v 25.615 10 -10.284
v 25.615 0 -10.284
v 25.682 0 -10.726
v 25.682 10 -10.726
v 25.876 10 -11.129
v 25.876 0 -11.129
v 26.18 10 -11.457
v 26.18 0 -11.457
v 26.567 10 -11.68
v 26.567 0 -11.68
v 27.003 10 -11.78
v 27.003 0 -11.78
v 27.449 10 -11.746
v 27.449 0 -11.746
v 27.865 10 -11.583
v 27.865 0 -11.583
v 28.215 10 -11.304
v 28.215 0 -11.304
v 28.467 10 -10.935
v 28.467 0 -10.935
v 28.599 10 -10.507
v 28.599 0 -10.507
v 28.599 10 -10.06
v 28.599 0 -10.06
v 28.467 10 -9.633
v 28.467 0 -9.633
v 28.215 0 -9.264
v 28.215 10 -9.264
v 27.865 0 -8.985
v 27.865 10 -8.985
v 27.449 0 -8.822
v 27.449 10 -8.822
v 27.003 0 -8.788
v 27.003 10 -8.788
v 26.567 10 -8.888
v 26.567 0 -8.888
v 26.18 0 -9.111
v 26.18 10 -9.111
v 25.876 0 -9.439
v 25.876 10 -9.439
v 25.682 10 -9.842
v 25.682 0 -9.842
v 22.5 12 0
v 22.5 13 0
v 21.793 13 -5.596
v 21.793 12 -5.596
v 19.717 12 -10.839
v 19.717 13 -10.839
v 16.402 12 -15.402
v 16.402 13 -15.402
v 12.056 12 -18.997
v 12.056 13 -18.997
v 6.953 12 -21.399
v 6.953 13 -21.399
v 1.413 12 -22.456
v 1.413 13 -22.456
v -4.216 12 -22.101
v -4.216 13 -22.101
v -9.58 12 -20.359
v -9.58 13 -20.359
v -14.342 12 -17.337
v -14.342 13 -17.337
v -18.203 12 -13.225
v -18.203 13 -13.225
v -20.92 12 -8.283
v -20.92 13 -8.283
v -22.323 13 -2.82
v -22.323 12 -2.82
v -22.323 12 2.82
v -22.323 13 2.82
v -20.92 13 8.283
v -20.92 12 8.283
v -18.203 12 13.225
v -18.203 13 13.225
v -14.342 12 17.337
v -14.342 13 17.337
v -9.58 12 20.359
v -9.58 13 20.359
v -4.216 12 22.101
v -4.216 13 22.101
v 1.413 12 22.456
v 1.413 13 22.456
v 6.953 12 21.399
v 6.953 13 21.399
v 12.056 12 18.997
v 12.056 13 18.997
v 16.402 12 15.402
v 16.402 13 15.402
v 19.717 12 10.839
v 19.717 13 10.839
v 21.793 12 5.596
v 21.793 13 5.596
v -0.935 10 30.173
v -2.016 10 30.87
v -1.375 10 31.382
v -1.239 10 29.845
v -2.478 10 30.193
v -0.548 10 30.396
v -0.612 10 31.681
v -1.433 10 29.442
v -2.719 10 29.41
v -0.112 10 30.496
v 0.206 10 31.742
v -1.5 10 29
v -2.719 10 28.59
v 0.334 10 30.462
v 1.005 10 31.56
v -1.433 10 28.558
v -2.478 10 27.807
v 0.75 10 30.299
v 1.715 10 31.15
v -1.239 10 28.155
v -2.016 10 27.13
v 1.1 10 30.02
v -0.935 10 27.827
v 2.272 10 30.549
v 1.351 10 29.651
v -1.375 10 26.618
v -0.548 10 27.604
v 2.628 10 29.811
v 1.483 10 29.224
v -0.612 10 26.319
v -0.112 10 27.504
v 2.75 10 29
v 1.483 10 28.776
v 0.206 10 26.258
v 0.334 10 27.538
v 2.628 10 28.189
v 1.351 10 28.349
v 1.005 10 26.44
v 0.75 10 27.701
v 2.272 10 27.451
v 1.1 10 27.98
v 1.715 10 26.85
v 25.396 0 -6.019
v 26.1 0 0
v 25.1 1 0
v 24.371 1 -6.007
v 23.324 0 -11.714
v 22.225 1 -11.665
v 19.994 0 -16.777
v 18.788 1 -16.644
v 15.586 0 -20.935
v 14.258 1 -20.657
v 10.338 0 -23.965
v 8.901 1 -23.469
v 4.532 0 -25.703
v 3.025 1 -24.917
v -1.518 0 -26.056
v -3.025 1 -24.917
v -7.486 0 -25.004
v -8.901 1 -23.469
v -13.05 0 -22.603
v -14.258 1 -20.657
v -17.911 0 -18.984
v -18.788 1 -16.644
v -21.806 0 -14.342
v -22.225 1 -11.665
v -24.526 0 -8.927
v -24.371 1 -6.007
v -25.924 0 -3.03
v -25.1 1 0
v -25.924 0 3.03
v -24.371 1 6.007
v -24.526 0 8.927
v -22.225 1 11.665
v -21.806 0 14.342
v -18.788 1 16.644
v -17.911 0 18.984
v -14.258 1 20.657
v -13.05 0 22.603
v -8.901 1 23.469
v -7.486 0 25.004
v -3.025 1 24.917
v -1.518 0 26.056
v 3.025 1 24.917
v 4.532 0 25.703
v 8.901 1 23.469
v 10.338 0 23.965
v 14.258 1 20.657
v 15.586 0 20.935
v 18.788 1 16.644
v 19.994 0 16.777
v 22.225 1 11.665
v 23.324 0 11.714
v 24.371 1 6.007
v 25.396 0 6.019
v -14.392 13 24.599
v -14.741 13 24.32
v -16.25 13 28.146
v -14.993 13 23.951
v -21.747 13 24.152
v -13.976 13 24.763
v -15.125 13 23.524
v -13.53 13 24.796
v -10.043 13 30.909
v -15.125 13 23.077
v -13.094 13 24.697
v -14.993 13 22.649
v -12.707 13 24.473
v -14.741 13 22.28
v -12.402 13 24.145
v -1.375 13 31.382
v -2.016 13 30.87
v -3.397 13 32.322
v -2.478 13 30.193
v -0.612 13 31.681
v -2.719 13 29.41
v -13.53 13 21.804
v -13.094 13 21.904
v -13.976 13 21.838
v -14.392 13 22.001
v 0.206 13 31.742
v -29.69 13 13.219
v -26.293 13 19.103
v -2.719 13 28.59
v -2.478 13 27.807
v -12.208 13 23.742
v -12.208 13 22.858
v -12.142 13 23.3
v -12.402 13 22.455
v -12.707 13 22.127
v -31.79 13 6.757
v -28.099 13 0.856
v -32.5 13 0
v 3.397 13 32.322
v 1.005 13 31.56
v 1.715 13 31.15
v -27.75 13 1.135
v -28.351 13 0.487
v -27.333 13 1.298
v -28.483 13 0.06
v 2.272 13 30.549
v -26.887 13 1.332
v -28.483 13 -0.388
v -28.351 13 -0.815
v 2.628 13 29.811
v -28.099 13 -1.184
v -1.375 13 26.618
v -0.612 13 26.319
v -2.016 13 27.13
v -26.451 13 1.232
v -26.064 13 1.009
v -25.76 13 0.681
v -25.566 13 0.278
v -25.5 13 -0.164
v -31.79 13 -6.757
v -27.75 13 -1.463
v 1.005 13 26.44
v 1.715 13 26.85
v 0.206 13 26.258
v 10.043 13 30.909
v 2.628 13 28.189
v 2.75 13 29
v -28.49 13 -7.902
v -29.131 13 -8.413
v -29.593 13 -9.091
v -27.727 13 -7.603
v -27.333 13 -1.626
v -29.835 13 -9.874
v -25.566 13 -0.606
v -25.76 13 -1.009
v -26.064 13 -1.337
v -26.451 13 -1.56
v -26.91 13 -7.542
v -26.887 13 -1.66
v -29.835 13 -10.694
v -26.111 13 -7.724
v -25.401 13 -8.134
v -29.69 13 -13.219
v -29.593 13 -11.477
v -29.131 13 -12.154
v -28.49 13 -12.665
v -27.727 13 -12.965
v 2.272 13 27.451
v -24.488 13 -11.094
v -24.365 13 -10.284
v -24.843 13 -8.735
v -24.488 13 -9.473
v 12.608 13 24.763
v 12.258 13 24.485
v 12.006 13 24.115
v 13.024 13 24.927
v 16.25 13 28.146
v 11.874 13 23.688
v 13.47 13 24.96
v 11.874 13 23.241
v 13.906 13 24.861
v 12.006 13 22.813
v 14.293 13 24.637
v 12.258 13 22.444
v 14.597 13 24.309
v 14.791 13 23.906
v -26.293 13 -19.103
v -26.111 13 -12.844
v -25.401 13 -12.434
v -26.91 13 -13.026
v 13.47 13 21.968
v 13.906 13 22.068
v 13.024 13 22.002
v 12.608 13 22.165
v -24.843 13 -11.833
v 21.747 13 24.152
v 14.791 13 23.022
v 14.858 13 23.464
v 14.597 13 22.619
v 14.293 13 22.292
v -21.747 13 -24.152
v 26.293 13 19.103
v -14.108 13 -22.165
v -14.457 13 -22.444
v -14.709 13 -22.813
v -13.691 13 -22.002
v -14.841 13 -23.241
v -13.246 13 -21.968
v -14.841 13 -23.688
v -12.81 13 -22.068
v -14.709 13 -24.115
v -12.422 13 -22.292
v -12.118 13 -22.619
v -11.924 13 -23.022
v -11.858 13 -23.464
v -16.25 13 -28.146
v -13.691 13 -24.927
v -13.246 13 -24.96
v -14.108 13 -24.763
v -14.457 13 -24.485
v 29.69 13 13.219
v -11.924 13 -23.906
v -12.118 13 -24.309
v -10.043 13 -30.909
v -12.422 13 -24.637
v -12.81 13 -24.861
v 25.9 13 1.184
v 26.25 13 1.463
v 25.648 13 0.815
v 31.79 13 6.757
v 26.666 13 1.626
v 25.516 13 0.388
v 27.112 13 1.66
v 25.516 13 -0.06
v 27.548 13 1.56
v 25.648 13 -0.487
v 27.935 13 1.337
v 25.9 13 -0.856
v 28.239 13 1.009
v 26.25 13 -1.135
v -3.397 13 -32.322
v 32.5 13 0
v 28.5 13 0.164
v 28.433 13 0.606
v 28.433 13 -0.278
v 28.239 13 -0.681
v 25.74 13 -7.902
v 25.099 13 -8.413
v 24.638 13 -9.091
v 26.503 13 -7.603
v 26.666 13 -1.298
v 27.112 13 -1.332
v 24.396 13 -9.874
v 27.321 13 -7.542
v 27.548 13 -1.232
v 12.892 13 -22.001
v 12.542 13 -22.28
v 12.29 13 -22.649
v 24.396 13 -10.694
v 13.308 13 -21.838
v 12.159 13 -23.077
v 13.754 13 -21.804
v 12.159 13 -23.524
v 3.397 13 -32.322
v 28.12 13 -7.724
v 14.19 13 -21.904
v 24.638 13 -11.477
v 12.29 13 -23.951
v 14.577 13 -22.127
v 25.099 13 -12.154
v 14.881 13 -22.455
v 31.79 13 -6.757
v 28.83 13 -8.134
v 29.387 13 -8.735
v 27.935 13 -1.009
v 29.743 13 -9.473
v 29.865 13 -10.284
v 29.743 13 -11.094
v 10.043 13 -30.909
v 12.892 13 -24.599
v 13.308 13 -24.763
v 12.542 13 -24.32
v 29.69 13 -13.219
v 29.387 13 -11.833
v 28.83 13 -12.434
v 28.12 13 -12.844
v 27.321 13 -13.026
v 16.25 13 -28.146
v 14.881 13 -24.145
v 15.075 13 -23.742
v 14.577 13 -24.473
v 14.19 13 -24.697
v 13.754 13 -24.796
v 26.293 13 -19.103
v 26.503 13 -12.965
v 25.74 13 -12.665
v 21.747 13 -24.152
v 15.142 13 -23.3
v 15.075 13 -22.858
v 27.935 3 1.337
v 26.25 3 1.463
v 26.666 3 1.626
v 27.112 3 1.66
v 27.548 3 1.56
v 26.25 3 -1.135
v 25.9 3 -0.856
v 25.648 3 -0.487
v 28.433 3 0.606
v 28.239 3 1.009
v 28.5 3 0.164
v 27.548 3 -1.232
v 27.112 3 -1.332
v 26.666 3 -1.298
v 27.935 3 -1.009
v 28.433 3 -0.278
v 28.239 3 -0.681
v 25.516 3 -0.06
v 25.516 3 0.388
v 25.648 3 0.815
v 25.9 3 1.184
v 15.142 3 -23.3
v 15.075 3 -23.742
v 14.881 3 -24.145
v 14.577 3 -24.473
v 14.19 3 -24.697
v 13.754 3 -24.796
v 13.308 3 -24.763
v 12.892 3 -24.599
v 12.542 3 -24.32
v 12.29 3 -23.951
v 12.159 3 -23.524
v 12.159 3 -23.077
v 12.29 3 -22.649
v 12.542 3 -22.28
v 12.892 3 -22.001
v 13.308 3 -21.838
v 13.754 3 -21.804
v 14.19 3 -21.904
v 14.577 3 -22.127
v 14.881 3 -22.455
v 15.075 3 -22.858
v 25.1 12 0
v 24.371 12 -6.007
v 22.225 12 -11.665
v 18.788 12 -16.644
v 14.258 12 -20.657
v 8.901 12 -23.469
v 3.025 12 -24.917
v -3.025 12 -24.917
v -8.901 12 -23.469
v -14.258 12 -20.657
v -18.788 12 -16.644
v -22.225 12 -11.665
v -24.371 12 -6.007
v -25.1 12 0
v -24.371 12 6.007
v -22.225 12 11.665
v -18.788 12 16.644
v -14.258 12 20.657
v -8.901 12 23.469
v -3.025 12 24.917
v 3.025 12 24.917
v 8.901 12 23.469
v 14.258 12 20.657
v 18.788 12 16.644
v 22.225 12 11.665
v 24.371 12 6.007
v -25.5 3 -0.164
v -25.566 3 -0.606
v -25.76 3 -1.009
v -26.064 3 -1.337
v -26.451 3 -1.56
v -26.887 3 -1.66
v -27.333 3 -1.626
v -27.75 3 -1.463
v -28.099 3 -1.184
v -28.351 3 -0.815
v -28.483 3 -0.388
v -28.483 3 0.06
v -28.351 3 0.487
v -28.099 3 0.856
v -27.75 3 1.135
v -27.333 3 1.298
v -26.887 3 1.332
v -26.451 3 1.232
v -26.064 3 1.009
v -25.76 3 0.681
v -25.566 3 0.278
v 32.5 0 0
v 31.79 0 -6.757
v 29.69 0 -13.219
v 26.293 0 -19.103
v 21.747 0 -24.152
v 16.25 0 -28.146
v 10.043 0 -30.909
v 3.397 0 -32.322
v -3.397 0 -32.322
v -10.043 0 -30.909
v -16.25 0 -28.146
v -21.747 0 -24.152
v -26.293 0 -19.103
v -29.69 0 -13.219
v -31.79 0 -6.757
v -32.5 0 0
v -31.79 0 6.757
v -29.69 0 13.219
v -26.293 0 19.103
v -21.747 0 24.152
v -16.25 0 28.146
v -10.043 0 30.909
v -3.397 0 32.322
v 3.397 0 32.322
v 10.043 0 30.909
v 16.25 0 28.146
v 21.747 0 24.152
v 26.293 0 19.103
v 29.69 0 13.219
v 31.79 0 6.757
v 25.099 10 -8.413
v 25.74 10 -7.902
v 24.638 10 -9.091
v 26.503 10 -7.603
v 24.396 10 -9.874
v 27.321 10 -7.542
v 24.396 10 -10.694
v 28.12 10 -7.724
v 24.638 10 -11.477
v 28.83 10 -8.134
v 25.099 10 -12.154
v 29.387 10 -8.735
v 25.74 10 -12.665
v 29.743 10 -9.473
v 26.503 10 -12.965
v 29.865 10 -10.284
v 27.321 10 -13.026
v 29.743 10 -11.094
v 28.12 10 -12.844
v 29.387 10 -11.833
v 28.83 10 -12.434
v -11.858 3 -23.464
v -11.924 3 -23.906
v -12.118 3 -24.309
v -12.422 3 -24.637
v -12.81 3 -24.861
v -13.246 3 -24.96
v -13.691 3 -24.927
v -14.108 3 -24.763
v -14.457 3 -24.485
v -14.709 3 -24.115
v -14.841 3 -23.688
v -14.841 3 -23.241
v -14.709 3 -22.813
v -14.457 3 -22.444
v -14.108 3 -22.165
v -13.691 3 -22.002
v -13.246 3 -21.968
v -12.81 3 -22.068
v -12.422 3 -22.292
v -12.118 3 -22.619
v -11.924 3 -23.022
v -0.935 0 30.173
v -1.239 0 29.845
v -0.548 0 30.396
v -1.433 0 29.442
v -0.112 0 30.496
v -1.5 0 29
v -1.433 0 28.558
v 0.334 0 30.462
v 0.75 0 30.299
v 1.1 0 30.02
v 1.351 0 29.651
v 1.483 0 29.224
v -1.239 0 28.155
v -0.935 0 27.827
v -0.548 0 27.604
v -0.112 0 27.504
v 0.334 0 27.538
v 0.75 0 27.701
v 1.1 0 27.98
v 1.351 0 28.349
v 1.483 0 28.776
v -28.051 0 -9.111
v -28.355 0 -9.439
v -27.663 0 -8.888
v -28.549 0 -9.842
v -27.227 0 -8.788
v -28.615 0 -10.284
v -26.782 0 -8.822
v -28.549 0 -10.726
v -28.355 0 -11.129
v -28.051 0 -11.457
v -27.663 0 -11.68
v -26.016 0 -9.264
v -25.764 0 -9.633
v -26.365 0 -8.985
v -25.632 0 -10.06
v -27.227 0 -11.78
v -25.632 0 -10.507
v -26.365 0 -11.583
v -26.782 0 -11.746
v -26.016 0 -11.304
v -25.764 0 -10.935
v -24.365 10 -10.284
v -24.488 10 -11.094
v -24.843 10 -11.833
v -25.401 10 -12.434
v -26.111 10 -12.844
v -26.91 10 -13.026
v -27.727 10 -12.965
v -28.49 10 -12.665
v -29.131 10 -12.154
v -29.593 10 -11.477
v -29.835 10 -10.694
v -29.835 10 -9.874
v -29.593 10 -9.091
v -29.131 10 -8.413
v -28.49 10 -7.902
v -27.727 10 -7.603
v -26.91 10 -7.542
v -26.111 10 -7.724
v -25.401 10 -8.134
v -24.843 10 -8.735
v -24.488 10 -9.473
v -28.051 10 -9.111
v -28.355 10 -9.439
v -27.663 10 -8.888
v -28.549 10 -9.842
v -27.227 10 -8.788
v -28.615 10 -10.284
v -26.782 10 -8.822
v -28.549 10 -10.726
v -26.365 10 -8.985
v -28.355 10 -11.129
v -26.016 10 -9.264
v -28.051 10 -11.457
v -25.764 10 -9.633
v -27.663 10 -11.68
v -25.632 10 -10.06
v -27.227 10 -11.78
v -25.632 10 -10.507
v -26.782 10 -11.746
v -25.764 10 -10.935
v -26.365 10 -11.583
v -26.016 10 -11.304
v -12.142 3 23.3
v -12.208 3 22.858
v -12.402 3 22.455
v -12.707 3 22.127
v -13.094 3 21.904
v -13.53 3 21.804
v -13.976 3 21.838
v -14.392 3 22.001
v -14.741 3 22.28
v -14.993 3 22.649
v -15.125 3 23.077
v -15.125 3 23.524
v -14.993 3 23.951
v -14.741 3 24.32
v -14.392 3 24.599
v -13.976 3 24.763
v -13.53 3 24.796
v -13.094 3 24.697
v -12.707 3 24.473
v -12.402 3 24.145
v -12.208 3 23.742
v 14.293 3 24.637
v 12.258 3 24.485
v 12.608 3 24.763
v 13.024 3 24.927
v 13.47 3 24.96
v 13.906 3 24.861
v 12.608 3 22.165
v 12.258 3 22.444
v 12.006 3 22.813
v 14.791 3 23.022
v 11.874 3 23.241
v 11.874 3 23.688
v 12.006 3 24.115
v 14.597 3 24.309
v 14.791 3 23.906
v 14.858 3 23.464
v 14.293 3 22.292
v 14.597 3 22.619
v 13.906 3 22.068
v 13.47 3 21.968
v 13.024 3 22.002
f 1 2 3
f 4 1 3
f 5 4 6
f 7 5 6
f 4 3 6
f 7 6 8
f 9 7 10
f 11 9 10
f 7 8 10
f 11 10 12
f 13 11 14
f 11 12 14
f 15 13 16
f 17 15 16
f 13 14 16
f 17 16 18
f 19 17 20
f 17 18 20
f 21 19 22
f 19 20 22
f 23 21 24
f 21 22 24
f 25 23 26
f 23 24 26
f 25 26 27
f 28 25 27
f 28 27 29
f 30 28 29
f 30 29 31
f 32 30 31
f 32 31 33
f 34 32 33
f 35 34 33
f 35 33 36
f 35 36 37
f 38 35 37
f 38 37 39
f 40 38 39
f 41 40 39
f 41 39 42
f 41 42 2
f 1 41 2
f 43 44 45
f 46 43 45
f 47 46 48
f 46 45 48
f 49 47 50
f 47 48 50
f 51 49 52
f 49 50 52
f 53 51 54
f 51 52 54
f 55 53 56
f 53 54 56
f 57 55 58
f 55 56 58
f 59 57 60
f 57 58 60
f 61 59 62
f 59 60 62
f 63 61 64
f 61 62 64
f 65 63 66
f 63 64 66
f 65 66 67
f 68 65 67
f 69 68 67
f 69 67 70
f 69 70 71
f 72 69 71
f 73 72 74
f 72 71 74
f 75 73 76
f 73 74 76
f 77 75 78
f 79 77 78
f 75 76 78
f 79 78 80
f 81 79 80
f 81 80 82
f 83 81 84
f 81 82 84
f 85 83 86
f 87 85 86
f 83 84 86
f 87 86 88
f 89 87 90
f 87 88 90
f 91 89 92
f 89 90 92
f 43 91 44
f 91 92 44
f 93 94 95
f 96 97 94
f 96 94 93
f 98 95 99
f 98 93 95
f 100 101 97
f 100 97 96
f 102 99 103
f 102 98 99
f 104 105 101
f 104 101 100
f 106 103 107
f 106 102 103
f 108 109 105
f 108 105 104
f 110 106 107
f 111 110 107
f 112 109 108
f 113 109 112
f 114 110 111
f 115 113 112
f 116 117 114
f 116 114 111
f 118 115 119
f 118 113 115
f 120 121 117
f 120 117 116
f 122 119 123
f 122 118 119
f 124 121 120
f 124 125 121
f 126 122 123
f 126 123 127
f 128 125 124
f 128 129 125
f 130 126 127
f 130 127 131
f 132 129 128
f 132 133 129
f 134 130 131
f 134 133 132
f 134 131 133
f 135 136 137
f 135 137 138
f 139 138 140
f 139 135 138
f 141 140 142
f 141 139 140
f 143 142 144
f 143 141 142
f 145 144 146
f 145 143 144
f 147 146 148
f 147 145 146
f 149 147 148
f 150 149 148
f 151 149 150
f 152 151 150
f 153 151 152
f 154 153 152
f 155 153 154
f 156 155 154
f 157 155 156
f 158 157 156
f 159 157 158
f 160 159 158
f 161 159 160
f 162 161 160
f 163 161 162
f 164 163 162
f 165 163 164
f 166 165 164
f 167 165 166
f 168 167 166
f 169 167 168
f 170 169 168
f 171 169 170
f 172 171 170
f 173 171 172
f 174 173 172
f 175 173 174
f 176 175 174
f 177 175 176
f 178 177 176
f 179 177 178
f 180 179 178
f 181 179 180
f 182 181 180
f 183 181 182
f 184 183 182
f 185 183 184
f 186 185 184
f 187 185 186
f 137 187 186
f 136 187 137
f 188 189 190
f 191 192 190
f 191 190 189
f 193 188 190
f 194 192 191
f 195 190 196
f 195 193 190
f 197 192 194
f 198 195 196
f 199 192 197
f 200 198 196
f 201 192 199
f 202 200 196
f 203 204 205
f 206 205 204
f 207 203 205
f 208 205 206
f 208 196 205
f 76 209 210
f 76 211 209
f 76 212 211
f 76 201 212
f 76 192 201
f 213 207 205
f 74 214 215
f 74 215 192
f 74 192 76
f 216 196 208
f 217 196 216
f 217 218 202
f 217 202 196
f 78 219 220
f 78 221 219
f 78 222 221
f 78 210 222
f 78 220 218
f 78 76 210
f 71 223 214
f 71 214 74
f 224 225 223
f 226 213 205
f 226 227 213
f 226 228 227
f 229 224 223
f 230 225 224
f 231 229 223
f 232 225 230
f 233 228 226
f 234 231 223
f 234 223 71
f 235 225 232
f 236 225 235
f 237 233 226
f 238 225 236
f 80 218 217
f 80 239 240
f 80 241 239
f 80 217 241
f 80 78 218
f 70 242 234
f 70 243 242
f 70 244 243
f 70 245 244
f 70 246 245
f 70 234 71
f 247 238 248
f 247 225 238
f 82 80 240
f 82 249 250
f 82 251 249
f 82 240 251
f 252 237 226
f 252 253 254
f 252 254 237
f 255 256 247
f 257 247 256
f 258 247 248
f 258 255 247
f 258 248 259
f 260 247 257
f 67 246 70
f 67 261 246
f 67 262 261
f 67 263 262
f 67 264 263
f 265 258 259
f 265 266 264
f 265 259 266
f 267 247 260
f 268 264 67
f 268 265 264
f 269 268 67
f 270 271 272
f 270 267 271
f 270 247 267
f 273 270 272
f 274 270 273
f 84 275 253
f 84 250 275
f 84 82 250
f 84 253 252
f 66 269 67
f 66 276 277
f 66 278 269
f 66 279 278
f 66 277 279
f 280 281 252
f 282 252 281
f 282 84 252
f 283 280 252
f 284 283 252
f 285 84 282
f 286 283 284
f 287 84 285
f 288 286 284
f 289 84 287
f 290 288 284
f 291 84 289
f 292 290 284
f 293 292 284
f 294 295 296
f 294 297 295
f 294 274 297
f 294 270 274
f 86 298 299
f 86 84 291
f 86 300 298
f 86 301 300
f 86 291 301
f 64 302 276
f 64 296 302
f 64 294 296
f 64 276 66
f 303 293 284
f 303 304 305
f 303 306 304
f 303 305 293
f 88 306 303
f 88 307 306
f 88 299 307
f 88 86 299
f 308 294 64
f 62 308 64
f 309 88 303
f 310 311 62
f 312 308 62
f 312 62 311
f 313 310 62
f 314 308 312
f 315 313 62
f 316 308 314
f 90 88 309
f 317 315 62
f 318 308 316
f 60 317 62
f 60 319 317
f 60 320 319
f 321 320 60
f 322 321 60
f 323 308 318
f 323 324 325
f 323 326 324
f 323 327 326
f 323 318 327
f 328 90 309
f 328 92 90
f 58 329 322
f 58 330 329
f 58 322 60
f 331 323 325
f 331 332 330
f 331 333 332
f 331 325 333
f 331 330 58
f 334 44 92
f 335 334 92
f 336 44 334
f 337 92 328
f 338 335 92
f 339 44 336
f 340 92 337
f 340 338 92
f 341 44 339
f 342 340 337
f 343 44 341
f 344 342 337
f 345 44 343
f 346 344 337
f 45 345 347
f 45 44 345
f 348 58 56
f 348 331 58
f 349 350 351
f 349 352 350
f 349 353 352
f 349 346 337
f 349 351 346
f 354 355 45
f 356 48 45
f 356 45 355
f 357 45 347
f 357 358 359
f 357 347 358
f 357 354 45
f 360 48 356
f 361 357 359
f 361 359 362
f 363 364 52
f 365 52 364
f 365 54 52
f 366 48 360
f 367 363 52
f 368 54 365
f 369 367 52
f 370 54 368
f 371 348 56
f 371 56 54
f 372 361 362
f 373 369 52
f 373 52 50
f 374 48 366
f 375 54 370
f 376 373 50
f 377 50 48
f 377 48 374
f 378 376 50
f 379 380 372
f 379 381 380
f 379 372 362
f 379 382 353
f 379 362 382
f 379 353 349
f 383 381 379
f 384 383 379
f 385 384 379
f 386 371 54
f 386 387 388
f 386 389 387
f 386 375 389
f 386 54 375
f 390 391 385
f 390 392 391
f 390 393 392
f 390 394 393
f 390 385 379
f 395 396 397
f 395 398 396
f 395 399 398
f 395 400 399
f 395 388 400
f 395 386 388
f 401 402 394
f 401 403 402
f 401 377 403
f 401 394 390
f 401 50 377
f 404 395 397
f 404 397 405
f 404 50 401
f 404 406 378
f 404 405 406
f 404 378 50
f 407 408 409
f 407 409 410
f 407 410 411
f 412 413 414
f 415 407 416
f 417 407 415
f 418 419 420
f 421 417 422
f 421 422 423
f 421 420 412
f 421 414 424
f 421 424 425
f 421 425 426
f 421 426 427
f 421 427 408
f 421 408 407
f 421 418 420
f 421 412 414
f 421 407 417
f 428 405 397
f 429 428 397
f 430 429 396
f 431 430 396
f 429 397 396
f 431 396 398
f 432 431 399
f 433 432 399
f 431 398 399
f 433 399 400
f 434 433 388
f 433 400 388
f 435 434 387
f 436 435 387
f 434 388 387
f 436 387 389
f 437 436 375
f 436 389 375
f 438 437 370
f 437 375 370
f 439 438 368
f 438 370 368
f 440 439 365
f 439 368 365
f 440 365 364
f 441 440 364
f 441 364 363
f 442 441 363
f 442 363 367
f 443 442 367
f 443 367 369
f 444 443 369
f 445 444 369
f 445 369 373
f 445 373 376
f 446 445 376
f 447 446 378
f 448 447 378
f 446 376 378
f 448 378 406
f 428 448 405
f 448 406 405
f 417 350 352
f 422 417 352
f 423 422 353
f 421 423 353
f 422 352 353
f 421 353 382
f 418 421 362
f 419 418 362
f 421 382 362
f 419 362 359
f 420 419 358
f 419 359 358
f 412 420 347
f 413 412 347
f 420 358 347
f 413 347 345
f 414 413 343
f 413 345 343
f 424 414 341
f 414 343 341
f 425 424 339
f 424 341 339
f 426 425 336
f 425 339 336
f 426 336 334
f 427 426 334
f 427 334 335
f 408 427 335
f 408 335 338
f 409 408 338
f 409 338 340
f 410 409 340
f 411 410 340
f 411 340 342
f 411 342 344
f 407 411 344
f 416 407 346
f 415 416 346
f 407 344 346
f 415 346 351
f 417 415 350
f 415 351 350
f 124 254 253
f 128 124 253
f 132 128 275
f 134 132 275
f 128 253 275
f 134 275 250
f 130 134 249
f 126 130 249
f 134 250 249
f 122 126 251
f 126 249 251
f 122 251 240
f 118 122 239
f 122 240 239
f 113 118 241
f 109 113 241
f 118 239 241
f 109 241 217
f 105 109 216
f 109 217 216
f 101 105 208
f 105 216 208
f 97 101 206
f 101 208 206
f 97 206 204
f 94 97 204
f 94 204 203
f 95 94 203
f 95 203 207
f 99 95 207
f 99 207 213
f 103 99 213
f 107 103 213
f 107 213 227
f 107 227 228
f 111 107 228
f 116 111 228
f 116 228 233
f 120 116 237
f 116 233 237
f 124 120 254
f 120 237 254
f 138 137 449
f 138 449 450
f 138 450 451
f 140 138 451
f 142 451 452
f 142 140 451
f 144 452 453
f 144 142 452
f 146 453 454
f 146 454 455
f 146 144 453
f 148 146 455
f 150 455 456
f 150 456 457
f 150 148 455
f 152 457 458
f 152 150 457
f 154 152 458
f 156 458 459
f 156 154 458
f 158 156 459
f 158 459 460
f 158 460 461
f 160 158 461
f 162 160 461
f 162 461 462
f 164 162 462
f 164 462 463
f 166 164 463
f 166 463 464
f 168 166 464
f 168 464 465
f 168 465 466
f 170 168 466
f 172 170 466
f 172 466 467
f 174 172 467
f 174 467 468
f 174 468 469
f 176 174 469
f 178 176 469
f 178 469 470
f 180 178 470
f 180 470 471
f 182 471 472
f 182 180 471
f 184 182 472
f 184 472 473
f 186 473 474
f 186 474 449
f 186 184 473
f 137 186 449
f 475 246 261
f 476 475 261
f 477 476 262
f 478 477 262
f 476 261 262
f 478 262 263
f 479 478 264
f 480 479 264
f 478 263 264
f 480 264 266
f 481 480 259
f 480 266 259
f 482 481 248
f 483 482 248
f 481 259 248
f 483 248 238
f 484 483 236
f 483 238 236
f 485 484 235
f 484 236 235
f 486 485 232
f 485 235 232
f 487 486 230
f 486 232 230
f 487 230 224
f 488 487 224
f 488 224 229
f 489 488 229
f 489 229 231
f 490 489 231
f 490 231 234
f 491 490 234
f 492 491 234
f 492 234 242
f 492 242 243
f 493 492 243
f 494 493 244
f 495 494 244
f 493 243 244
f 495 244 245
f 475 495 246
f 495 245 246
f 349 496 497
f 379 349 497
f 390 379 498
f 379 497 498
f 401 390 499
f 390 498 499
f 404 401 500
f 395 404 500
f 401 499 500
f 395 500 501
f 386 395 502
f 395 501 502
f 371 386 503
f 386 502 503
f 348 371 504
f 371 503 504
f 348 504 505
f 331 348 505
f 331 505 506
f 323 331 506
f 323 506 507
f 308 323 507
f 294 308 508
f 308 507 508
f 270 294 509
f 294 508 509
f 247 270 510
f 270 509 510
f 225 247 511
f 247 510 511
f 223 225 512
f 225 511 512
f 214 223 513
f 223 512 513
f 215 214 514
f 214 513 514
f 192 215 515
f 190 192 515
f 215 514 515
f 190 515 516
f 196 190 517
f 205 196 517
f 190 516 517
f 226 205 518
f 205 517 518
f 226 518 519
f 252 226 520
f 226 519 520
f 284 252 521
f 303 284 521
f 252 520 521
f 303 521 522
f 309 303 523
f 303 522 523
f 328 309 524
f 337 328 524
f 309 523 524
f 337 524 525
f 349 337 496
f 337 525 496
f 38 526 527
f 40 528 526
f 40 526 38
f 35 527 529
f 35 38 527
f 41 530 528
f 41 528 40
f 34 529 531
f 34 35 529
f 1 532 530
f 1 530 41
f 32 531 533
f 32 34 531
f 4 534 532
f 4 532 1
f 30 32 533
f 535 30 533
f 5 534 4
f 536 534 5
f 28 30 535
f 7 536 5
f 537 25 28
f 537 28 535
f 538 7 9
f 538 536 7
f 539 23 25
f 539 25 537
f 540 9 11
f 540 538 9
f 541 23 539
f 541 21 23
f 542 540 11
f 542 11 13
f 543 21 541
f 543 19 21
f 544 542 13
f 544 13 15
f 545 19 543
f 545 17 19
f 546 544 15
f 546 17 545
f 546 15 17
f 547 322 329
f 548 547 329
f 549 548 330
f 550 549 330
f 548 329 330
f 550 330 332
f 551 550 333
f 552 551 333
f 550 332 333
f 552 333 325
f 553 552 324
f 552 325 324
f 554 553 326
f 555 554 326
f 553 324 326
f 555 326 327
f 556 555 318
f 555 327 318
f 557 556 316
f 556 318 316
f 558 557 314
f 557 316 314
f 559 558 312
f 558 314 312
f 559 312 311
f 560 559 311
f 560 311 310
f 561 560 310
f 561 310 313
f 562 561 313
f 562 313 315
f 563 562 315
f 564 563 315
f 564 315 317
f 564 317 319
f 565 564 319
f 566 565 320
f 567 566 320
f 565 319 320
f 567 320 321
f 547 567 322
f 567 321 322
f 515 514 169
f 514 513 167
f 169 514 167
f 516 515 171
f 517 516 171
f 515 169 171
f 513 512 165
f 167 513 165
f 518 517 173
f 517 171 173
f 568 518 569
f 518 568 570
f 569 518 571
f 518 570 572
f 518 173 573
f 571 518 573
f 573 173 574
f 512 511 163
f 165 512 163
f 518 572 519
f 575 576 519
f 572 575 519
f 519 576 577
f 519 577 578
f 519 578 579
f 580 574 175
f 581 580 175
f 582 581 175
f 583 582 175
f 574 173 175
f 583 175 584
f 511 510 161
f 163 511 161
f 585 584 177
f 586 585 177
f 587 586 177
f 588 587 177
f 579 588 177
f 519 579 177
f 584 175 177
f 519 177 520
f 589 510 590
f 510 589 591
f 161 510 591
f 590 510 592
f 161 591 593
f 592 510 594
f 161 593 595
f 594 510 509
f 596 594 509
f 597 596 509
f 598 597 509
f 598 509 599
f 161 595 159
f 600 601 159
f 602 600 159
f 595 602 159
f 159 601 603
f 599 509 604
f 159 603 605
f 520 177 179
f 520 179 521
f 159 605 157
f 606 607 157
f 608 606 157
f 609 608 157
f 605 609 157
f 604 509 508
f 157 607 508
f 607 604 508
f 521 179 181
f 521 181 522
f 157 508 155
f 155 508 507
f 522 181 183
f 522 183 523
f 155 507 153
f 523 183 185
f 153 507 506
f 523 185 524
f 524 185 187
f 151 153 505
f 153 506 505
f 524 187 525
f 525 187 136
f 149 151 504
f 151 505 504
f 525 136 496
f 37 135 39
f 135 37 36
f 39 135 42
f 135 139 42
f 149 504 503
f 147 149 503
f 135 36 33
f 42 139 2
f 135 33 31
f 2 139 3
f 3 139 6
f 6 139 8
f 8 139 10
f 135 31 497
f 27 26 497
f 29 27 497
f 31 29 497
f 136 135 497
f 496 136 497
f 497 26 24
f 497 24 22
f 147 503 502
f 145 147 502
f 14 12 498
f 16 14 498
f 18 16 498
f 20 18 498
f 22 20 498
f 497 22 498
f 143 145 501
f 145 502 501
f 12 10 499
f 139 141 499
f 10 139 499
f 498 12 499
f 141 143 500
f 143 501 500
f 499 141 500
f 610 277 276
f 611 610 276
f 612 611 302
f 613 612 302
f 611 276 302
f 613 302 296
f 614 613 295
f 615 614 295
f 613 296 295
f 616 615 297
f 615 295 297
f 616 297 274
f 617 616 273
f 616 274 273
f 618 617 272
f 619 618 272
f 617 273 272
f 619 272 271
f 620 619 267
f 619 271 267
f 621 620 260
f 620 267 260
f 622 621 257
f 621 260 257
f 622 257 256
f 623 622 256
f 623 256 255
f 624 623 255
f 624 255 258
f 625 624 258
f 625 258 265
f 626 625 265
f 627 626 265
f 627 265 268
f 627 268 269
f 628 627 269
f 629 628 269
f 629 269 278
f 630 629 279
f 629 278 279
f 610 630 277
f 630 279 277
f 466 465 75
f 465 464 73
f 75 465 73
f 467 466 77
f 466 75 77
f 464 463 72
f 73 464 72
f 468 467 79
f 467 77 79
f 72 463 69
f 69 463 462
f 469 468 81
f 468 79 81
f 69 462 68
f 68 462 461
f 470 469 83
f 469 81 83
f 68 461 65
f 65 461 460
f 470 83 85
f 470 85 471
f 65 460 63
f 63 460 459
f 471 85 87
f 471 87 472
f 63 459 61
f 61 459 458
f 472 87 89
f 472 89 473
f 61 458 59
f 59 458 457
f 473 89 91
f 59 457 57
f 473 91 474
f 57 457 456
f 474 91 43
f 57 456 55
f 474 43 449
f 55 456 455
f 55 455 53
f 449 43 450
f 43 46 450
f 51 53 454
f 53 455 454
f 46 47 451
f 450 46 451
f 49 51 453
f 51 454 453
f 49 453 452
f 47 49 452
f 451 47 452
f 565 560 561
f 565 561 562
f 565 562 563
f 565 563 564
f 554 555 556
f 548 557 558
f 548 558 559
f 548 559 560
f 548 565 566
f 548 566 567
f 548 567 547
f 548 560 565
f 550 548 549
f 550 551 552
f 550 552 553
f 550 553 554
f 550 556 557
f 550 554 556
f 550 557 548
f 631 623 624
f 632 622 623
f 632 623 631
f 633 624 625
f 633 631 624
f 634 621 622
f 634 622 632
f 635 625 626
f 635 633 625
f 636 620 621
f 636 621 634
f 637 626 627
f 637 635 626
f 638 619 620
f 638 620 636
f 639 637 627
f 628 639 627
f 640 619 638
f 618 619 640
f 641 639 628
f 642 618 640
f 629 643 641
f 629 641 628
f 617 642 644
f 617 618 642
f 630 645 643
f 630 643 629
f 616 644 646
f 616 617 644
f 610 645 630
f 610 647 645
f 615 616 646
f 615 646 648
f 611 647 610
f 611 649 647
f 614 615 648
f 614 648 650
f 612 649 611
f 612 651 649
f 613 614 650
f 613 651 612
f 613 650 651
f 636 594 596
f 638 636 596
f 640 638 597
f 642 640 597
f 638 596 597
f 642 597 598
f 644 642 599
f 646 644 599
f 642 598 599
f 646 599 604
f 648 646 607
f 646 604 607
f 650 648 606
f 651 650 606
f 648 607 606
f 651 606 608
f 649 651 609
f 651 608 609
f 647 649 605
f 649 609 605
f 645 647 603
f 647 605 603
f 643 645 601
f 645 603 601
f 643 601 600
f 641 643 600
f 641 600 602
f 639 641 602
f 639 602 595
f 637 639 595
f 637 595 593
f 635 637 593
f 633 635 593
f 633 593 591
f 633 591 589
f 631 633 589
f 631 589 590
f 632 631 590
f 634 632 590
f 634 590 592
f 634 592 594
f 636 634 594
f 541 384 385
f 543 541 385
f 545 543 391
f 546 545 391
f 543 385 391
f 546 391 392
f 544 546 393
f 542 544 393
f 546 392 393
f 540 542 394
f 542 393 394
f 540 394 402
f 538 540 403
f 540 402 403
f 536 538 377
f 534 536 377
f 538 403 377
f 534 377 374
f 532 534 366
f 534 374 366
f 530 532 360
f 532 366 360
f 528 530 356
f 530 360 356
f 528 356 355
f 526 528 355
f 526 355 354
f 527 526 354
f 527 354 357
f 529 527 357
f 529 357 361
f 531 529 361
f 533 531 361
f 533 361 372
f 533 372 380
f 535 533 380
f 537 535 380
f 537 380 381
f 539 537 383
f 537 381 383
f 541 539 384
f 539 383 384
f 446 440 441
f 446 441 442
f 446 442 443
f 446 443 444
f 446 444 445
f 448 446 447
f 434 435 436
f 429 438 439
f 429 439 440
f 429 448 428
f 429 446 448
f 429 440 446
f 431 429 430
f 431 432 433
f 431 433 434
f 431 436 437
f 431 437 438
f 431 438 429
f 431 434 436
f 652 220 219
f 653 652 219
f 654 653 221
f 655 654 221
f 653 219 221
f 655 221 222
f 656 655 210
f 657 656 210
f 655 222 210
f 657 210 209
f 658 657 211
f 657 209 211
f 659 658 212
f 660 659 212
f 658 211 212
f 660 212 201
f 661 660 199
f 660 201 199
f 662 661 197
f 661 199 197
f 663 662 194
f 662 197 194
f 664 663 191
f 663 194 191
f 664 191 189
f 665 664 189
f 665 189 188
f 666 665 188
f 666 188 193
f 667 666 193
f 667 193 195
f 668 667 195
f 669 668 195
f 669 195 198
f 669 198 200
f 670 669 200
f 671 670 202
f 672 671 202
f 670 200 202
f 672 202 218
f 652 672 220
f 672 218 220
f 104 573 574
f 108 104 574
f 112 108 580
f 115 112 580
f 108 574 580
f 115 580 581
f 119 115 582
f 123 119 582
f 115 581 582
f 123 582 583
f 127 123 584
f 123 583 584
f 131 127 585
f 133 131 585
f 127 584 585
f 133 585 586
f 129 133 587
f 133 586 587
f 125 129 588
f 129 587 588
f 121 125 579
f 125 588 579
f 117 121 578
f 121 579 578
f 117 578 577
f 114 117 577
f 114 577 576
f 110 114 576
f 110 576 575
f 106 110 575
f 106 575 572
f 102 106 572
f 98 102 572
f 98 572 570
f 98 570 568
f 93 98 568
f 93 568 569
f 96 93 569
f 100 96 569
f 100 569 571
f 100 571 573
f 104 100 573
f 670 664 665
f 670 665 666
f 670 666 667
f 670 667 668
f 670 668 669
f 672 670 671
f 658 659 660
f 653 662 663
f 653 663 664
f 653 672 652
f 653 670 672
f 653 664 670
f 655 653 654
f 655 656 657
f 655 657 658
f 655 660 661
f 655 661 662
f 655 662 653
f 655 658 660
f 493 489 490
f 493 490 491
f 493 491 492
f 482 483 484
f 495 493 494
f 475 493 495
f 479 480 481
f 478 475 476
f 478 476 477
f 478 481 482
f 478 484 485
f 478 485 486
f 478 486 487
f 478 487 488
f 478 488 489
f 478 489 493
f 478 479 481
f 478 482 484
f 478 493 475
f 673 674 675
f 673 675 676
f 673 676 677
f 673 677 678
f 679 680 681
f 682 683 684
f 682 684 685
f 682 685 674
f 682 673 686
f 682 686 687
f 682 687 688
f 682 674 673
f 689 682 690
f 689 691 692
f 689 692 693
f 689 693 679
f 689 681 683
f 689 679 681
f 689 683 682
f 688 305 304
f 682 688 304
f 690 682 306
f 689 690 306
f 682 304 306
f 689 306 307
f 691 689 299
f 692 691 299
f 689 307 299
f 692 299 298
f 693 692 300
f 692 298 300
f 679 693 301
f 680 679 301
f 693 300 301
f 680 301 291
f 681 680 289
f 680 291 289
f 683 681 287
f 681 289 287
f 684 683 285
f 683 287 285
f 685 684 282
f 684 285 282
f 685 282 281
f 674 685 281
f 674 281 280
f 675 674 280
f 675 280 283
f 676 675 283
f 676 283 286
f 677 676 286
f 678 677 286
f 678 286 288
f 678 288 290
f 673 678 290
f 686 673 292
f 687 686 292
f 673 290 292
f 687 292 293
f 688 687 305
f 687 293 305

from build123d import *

# Parameters (mm, degrees)
SKETCH1_R           = 32.5
SKETCH1_R_2         = 25.1
BOSS_EXTRUDE1_DEPTH = 13
SKETCH2_R           = 25.1
SKETCH2_R_2         = 22.5
BOSS_EXTRUDE2_DEPTH = 1
SKETCH3_R           = 1.5
CUT_EXTRUDE1_DEPTH  = 14
CHAMFER1_SIZE       = 1
SKETCH4_R           = 2.75
CUT_EXTRUDE2_DEPTH  = 3
SKETCH5_R           = 1.5
CUT_EXTRUDE3_DEPTH  = 10


with BuildPart() as part:
    # Sketch1 → Boss-Extrude1 (new body)
    with BuildSketch(Plane(origin=(0, 0, 0), x_dir=(1, 0, 0), z_dir=(0, 1, 0))):
        Circle(SKETCH1_R)
        Circle(SKETCH1_R_2, mode=Mode.SUBTRACT)
    extrude(amount=BOSS_EXTRUDE1_DEPTH)

    # Sketch2 → Boss-Extrude2 (add)
    with BuildSketch(Plane(origin=(0, 13, 0), x_dir=(1, 0, 0), z_dir=(0, 1, 0))):
        Circle(SKETCH2_R)
        Circle(SKETCH2_R_2, mode=Mode.SUBTRACT)
    extrude(amount=-BOSS_EXTRUDE2_DEPTH)

    # Sketch3 → Cut-Extrude1 (cut, through all)
    with BuildSketch(Plane(origin=(0, 0, 0), x_dir=(-1, 0, 0), z_dir=(0, -1, 0))):
        with Locations((0, -29)):
            Circle(SKETCH3_R)
        with Locations((-27.115332973, 10.283905765)):
            Circle(SKETCH3_R)
        with Locations((27.115332973, 10.283905765)):
            Circle(SKETCH3_R)
    extrude(amount=-CUT_EXTRUDE1_DEPTH, mode=Mode.SUBTRACT)

    # Chamfer1
    chamfer1_edges = [part.edges().sort_by_distance(p)[0] for p in [
        (-25.1, 0, 0),
    ]]
    chamfer(chamfer1_edges, length=CHAMFER1_SIZE)

    # Sketch4 → Cut-Extrude2 (cut)
    with BuildSketch(Plane(origin=(0, 13, 0), x_dir=(1, 0, 0), z_dir=(0, 1, 0))):
        with Locations((-27.115332973, 10.283905765)):
            Circle(SKETCH4_R)
        with Locations((27.115332973, 10.283905765)):
            Circle(SKETCH4_R)
        with Locations((0, -29)):
            Circle(SKETCH4_R)
    extrude(amount=-CUT_EXTRUDE2_DEPTH, mode=Mode.SUBTRACT)

    # Sketch5 → Cut-Extrude3 (cut)
    with BuildSketch(Plane(origin=(0, 13, 0), x_dir=(1, 0, 0), z_dir=(0, 1, 0))):
        with Locations((13.641823983, 23.300228291)):
            Circle(SKETCH5_R)
        with Locations((26.999501606, -0.164051977)):
            Circle(SKETCH5_R)
        with Locations((13.357677623, -23.464280269)):
            Circle(SKETCH5_R)
        with Locations((-13.641823983, -23.300228291)):
            Circle(SKETCH5_R)
        with Locations((-26.999501606, 0.164051977)):
            Circle(SKETCH5_R)
        with Locations((-13.357677623, 23.464280269)):
            Circle(SKETCH5_R)
    extrude(amount=-CUT_EXTRUDE3_DEPTH, mode=Mode.SUBTRACT)


solid = part.part
